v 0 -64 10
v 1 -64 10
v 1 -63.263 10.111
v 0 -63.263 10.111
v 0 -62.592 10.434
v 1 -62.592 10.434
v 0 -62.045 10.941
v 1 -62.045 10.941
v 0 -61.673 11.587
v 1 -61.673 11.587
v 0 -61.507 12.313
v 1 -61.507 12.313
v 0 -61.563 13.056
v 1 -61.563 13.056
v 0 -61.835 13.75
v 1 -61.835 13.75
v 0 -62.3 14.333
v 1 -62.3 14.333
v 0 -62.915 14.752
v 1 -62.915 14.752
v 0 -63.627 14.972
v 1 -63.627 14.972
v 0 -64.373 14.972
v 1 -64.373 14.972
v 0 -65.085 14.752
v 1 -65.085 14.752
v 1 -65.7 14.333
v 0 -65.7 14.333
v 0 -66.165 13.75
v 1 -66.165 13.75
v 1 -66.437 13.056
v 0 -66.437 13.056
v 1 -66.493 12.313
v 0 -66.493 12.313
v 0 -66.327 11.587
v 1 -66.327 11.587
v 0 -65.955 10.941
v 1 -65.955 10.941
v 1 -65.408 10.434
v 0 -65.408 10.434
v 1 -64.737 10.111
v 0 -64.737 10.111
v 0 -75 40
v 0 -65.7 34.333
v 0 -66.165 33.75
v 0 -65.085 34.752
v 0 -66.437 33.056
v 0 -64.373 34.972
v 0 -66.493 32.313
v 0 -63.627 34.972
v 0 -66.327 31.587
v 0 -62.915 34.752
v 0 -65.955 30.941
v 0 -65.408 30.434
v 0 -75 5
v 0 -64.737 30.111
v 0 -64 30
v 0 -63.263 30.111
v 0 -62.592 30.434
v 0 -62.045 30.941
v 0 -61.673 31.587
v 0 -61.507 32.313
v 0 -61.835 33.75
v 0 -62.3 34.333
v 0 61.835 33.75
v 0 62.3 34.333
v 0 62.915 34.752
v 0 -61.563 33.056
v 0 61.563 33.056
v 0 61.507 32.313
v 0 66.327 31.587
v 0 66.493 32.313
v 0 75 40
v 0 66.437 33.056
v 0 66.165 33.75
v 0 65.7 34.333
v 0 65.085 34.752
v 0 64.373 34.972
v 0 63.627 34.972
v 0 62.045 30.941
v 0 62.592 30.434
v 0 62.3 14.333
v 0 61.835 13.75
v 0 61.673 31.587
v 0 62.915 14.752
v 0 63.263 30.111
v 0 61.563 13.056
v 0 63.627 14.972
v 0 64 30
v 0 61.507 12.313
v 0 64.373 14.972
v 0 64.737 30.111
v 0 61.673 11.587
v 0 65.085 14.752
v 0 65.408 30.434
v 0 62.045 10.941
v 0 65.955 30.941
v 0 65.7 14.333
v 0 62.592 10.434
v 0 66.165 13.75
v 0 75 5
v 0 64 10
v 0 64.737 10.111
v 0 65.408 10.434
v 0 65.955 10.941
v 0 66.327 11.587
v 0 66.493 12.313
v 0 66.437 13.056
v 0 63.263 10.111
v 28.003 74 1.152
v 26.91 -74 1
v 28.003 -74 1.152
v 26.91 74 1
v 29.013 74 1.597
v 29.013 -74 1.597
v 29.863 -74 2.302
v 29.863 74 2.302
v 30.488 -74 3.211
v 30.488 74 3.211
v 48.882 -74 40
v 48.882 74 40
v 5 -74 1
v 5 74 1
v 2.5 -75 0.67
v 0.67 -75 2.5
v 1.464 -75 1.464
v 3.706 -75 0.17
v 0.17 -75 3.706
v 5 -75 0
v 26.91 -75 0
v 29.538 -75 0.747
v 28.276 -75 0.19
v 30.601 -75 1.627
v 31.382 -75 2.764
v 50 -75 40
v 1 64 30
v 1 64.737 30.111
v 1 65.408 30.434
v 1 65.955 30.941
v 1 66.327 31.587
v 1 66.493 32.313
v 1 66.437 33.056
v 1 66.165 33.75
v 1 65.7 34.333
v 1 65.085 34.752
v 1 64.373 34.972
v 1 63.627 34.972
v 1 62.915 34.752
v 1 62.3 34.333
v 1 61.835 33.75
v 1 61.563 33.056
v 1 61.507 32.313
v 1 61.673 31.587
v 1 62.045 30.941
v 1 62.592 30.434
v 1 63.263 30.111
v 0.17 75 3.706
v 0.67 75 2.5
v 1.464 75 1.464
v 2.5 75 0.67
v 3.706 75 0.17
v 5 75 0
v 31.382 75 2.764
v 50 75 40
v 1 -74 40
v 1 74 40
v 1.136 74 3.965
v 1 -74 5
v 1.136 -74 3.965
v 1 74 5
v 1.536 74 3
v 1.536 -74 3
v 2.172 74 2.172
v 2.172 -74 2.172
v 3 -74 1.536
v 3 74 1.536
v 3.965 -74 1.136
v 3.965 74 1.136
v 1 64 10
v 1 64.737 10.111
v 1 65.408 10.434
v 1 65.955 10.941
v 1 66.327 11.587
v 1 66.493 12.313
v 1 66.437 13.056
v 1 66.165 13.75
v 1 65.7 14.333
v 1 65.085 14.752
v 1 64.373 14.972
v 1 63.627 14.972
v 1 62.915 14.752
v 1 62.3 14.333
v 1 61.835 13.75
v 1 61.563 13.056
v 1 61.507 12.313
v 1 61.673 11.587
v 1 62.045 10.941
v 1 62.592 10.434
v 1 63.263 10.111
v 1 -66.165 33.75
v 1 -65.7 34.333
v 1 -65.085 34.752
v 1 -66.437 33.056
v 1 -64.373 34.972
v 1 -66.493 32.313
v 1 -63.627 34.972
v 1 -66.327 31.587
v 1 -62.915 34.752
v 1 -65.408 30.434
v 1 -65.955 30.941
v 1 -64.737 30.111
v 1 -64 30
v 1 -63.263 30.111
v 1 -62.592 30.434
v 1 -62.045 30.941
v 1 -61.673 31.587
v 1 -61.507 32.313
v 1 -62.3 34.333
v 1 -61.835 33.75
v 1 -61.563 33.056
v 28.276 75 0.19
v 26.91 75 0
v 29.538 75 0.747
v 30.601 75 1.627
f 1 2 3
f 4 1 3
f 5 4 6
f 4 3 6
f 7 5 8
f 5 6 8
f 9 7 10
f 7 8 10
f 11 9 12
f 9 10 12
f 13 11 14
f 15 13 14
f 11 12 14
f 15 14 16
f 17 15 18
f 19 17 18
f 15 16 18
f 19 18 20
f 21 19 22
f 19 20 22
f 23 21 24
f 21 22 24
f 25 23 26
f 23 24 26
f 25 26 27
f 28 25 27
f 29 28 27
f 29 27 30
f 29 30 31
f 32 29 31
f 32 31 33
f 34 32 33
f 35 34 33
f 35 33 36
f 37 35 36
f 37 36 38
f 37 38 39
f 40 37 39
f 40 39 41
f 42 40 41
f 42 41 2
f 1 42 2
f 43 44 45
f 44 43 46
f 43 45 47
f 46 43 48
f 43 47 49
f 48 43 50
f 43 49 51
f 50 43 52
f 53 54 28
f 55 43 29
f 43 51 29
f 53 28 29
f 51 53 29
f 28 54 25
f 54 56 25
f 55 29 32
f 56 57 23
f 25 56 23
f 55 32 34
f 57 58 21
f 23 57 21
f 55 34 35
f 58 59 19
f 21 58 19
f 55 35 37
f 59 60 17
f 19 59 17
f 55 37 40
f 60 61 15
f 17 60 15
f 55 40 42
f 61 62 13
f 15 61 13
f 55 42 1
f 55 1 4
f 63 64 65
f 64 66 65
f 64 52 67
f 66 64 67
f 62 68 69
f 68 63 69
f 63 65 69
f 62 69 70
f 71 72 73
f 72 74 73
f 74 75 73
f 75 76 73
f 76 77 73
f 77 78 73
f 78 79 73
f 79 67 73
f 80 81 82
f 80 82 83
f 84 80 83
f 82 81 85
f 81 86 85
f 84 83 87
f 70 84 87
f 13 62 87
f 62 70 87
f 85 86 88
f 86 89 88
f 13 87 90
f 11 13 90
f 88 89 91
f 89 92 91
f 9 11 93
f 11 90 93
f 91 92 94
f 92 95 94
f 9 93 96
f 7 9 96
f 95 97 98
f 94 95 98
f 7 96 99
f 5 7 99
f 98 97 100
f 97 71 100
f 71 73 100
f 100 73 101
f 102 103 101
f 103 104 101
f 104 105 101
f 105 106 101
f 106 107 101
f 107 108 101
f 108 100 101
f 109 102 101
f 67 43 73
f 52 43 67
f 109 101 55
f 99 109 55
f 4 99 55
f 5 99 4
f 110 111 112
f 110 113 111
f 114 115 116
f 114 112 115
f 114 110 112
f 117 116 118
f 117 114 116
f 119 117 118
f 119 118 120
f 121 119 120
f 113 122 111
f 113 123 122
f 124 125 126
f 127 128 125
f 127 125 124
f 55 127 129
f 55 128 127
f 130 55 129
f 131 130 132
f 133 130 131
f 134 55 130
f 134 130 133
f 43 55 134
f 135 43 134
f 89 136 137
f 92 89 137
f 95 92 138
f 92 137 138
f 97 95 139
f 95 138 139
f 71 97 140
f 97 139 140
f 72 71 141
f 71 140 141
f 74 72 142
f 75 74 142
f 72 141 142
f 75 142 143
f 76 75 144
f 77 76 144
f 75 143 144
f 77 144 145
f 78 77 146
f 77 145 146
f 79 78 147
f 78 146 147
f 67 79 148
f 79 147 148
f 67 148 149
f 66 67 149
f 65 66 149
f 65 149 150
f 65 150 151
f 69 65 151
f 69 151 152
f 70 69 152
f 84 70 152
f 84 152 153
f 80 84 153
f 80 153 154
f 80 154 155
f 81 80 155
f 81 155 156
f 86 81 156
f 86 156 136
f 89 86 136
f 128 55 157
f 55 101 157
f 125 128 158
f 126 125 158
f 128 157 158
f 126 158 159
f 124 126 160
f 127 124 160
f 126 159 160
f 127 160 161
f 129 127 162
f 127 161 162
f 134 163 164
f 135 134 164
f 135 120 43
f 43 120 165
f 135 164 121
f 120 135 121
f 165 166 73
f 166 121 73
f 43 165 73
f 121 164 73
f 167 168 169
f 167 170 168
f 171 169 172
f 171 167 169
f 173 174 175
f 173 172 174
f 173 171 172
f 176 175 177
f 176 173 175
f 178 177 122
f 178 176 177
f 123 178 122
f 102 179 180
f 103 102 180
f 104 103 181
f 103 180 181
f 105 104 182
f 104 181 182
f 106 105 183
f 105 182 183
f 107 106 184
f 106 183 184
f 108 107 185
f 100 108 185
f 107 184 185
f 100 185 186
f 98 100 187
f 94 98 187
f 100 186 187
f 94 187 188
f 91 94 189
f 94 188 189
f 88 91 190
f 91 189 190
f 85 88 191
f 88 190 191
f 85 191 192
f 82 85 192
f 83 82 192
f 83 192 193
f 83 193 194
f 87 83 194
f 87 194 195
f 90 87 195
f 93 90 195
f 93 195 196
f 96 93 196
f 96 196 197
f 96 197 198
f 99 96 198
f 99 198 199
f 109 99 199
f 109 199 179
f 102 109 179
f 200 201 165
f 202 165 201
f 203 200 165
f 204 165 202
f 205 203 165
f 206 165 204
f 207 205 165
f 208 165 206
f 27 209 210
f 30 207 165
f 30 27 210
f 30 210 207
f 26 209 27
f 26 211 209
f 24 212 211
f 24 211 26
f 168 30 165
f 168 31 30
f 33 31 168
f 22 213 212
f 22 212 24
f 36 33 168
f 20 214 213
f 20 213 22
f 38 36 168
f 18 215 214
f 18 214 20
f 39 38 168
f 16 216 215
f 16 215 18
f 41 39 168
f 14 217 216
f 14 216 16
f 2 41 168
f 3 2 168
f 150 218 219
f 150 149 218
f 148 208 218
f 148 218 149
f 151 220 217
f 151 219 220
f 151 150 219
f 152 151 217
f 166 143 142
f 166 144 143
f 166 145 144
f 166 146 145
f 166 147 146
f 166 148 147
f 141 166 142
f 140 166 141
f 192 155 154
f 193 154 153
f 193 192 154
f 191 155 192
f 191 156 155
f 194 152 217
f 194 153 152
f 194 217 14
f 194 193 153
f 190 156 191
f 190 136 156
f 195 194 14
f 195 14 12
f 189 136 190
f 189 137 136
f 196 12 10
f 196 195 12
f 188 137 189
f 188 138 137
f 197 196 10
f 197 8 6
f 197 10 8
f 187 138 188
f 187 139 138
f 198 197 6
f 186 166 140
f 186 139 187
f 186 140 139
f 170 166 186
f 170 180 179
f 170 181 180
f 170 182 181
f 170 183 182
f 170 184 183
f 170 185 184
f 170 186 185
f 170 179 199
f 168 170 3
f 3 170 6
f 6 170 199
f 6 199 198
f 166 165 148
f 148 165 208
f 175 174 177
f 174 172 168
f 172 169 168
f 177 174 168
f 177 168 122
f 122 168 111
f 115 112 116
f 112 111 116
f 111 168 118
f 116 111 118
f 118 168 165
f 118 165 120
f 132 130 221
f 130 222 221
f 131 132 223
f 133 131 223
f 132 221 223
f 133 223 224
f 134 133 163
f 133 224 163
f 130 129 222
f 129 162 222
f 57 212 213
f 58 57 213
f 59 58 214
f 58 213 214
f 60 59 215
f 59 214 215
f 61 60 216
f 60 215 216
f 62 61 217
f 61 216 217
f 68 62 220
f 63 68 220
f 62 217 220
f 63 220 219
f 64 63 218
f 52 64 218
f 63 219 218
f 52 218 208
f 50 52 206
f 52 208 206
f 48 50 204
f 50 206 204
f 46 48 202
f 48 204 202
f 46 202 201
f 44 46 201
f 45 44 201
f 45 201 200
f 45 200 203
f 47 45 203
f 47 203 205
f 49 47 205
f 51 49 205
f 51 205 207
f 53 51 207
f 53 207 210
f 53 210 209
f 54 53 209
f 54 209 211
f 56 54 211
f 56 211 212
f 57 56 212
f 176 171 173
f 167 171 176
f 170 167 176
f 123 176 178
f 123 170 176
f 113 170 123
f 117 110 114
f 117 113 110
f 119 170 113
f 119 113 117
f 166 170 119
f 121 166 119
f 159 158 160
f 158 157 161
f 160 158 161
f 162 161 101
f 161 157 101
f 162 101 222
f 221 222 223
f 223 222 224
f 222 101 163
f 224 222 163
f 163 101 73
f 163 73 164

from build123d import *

# Parameters (mm, degrees)
BOSS_EXTRUDE1_DEPTH = 75
SHELL1_T            = -1
CUT_EXTRUDE1_REACH  = 100.112
SKETCH3_R           = 2.5


with BuildPart() as part:
    # Sketch2 → Boss-Extrude1 (new, symmetric)
    with BuildSketch(Plane(origin=(0, 0, 0), x_dir=(-1, 0, 0), z_dir=(0, 1, 0))):
        with BuildLine():
            Line((0, 40), (0, 5))
            ThreePointArc((0, 5), (-1.464466094, 1.464466094), (-5, 0))
            Line((-5, 0), (-26.909830056, 0))
            ThreePointArc((-26.909830056, 0), (-29.538485617, 0.746745958), (-31.381966011, 2.763932023))
            Line((-31.381966011, 2.763932023), (-50, 40))
            Line((-50, 40), (0, 40))
        make_face()
    extrude(amount=BOSS_EXTRUDE1_DEPTH, both=True)

    # Shell1
    shell1_openings = [part.faces().sort_by_distance(p)[0] for p in [
        (25, 0, 40),
    ]]
    offset(amount=SHELL1_T, openings=shell1_openings, kind=Kind.INTERSECTION)

    # Sketch3 → Cut-Extrude1 (cut, up to next)
    with BuildSketch(Plane.YZ.offset(1), mode=Mode.PRIVATE) as cut_extrude1_sk1:
        with Locations(Location((-64, 32.5, 0), (0, 0, 270))):
            Circle(SKETCH3_R)
    cut_extrude1_tool1 = extrude(cut_extrude1_sk1.sketch, amount=-CUT_EXTRUDE1_REACH, mode=Mode.PRIVATE) & part.part
    # Sketch3 → Cut-Extrude1 (cut, up to next)
    with BuildSketch(Plane.YZ.offset(1), mode=Mode.PRIVATE) as cut_extrude1_sk2:
        with Locations(Location((-64, 12.5, 0), (0, 0, 270))):
            Circle(SKETCH3_R)
    cut_extrude1_tool2 = extrude(cut_extrude1_sk2.sketch, amount=-CUT_EXTRUDE1_REACH, mode=Mode.PRIVATE) & part.part
    # Sketch3 → Cut-Extrude1 (cut, up to next)
    with BuildSketch(Plane.YZ.offset(1), mode=Mode.PRIVATE) as cut_extrude1_sk3:
        with Locations(Location((64, 12.5, 0), (0, 0, 270))):
            Circle(SKETCH3_R)
    cut_extrude1_tool3 = extrude(cut_extrude1_sk3.sketch, amount=-CUT_EXTRUDE1_REACH, mode=Mode.PRIVATE) & part.part
    # Sketch3 → Cut-Extrude1 (cut, up to next)
    with BuildSketch(Plane.YZ.offset(1), mode=Mode.PRIVATE) as cut_extrude1_sk4:
        with Locations(Location((64, 32.5, 0), (0, 0, 270))):
            Circle(SKETCH3_R)
    cut_extrude1_tool4 = extrude(cut_extrude1_sk4.sketch, amount=-CUT_EXTRUDE1_REACH, mode=Mode.PRIVATE) & part.part
    add(cut_extrude1_tool1.solids().sort_by_distance((1, -64, 32.5))[0], mode=Mode.SUBTRACT)
    add(cut_extrude1_tool2.solids().sort_by_distance((1, -64, 12.5))[0], mode=Mode.SUBTRACT)
    add(cut_extrude1_tool3.solids().sort_by_distance((1, 64, 12.5))[0], mode=Mode.SUBTRACT)
    add(cut_extrude1_tool4.solids().sort_by_distance((1, 64, 32.5))[0], mode=Mode.SUBTRACT)


solid = part.part
